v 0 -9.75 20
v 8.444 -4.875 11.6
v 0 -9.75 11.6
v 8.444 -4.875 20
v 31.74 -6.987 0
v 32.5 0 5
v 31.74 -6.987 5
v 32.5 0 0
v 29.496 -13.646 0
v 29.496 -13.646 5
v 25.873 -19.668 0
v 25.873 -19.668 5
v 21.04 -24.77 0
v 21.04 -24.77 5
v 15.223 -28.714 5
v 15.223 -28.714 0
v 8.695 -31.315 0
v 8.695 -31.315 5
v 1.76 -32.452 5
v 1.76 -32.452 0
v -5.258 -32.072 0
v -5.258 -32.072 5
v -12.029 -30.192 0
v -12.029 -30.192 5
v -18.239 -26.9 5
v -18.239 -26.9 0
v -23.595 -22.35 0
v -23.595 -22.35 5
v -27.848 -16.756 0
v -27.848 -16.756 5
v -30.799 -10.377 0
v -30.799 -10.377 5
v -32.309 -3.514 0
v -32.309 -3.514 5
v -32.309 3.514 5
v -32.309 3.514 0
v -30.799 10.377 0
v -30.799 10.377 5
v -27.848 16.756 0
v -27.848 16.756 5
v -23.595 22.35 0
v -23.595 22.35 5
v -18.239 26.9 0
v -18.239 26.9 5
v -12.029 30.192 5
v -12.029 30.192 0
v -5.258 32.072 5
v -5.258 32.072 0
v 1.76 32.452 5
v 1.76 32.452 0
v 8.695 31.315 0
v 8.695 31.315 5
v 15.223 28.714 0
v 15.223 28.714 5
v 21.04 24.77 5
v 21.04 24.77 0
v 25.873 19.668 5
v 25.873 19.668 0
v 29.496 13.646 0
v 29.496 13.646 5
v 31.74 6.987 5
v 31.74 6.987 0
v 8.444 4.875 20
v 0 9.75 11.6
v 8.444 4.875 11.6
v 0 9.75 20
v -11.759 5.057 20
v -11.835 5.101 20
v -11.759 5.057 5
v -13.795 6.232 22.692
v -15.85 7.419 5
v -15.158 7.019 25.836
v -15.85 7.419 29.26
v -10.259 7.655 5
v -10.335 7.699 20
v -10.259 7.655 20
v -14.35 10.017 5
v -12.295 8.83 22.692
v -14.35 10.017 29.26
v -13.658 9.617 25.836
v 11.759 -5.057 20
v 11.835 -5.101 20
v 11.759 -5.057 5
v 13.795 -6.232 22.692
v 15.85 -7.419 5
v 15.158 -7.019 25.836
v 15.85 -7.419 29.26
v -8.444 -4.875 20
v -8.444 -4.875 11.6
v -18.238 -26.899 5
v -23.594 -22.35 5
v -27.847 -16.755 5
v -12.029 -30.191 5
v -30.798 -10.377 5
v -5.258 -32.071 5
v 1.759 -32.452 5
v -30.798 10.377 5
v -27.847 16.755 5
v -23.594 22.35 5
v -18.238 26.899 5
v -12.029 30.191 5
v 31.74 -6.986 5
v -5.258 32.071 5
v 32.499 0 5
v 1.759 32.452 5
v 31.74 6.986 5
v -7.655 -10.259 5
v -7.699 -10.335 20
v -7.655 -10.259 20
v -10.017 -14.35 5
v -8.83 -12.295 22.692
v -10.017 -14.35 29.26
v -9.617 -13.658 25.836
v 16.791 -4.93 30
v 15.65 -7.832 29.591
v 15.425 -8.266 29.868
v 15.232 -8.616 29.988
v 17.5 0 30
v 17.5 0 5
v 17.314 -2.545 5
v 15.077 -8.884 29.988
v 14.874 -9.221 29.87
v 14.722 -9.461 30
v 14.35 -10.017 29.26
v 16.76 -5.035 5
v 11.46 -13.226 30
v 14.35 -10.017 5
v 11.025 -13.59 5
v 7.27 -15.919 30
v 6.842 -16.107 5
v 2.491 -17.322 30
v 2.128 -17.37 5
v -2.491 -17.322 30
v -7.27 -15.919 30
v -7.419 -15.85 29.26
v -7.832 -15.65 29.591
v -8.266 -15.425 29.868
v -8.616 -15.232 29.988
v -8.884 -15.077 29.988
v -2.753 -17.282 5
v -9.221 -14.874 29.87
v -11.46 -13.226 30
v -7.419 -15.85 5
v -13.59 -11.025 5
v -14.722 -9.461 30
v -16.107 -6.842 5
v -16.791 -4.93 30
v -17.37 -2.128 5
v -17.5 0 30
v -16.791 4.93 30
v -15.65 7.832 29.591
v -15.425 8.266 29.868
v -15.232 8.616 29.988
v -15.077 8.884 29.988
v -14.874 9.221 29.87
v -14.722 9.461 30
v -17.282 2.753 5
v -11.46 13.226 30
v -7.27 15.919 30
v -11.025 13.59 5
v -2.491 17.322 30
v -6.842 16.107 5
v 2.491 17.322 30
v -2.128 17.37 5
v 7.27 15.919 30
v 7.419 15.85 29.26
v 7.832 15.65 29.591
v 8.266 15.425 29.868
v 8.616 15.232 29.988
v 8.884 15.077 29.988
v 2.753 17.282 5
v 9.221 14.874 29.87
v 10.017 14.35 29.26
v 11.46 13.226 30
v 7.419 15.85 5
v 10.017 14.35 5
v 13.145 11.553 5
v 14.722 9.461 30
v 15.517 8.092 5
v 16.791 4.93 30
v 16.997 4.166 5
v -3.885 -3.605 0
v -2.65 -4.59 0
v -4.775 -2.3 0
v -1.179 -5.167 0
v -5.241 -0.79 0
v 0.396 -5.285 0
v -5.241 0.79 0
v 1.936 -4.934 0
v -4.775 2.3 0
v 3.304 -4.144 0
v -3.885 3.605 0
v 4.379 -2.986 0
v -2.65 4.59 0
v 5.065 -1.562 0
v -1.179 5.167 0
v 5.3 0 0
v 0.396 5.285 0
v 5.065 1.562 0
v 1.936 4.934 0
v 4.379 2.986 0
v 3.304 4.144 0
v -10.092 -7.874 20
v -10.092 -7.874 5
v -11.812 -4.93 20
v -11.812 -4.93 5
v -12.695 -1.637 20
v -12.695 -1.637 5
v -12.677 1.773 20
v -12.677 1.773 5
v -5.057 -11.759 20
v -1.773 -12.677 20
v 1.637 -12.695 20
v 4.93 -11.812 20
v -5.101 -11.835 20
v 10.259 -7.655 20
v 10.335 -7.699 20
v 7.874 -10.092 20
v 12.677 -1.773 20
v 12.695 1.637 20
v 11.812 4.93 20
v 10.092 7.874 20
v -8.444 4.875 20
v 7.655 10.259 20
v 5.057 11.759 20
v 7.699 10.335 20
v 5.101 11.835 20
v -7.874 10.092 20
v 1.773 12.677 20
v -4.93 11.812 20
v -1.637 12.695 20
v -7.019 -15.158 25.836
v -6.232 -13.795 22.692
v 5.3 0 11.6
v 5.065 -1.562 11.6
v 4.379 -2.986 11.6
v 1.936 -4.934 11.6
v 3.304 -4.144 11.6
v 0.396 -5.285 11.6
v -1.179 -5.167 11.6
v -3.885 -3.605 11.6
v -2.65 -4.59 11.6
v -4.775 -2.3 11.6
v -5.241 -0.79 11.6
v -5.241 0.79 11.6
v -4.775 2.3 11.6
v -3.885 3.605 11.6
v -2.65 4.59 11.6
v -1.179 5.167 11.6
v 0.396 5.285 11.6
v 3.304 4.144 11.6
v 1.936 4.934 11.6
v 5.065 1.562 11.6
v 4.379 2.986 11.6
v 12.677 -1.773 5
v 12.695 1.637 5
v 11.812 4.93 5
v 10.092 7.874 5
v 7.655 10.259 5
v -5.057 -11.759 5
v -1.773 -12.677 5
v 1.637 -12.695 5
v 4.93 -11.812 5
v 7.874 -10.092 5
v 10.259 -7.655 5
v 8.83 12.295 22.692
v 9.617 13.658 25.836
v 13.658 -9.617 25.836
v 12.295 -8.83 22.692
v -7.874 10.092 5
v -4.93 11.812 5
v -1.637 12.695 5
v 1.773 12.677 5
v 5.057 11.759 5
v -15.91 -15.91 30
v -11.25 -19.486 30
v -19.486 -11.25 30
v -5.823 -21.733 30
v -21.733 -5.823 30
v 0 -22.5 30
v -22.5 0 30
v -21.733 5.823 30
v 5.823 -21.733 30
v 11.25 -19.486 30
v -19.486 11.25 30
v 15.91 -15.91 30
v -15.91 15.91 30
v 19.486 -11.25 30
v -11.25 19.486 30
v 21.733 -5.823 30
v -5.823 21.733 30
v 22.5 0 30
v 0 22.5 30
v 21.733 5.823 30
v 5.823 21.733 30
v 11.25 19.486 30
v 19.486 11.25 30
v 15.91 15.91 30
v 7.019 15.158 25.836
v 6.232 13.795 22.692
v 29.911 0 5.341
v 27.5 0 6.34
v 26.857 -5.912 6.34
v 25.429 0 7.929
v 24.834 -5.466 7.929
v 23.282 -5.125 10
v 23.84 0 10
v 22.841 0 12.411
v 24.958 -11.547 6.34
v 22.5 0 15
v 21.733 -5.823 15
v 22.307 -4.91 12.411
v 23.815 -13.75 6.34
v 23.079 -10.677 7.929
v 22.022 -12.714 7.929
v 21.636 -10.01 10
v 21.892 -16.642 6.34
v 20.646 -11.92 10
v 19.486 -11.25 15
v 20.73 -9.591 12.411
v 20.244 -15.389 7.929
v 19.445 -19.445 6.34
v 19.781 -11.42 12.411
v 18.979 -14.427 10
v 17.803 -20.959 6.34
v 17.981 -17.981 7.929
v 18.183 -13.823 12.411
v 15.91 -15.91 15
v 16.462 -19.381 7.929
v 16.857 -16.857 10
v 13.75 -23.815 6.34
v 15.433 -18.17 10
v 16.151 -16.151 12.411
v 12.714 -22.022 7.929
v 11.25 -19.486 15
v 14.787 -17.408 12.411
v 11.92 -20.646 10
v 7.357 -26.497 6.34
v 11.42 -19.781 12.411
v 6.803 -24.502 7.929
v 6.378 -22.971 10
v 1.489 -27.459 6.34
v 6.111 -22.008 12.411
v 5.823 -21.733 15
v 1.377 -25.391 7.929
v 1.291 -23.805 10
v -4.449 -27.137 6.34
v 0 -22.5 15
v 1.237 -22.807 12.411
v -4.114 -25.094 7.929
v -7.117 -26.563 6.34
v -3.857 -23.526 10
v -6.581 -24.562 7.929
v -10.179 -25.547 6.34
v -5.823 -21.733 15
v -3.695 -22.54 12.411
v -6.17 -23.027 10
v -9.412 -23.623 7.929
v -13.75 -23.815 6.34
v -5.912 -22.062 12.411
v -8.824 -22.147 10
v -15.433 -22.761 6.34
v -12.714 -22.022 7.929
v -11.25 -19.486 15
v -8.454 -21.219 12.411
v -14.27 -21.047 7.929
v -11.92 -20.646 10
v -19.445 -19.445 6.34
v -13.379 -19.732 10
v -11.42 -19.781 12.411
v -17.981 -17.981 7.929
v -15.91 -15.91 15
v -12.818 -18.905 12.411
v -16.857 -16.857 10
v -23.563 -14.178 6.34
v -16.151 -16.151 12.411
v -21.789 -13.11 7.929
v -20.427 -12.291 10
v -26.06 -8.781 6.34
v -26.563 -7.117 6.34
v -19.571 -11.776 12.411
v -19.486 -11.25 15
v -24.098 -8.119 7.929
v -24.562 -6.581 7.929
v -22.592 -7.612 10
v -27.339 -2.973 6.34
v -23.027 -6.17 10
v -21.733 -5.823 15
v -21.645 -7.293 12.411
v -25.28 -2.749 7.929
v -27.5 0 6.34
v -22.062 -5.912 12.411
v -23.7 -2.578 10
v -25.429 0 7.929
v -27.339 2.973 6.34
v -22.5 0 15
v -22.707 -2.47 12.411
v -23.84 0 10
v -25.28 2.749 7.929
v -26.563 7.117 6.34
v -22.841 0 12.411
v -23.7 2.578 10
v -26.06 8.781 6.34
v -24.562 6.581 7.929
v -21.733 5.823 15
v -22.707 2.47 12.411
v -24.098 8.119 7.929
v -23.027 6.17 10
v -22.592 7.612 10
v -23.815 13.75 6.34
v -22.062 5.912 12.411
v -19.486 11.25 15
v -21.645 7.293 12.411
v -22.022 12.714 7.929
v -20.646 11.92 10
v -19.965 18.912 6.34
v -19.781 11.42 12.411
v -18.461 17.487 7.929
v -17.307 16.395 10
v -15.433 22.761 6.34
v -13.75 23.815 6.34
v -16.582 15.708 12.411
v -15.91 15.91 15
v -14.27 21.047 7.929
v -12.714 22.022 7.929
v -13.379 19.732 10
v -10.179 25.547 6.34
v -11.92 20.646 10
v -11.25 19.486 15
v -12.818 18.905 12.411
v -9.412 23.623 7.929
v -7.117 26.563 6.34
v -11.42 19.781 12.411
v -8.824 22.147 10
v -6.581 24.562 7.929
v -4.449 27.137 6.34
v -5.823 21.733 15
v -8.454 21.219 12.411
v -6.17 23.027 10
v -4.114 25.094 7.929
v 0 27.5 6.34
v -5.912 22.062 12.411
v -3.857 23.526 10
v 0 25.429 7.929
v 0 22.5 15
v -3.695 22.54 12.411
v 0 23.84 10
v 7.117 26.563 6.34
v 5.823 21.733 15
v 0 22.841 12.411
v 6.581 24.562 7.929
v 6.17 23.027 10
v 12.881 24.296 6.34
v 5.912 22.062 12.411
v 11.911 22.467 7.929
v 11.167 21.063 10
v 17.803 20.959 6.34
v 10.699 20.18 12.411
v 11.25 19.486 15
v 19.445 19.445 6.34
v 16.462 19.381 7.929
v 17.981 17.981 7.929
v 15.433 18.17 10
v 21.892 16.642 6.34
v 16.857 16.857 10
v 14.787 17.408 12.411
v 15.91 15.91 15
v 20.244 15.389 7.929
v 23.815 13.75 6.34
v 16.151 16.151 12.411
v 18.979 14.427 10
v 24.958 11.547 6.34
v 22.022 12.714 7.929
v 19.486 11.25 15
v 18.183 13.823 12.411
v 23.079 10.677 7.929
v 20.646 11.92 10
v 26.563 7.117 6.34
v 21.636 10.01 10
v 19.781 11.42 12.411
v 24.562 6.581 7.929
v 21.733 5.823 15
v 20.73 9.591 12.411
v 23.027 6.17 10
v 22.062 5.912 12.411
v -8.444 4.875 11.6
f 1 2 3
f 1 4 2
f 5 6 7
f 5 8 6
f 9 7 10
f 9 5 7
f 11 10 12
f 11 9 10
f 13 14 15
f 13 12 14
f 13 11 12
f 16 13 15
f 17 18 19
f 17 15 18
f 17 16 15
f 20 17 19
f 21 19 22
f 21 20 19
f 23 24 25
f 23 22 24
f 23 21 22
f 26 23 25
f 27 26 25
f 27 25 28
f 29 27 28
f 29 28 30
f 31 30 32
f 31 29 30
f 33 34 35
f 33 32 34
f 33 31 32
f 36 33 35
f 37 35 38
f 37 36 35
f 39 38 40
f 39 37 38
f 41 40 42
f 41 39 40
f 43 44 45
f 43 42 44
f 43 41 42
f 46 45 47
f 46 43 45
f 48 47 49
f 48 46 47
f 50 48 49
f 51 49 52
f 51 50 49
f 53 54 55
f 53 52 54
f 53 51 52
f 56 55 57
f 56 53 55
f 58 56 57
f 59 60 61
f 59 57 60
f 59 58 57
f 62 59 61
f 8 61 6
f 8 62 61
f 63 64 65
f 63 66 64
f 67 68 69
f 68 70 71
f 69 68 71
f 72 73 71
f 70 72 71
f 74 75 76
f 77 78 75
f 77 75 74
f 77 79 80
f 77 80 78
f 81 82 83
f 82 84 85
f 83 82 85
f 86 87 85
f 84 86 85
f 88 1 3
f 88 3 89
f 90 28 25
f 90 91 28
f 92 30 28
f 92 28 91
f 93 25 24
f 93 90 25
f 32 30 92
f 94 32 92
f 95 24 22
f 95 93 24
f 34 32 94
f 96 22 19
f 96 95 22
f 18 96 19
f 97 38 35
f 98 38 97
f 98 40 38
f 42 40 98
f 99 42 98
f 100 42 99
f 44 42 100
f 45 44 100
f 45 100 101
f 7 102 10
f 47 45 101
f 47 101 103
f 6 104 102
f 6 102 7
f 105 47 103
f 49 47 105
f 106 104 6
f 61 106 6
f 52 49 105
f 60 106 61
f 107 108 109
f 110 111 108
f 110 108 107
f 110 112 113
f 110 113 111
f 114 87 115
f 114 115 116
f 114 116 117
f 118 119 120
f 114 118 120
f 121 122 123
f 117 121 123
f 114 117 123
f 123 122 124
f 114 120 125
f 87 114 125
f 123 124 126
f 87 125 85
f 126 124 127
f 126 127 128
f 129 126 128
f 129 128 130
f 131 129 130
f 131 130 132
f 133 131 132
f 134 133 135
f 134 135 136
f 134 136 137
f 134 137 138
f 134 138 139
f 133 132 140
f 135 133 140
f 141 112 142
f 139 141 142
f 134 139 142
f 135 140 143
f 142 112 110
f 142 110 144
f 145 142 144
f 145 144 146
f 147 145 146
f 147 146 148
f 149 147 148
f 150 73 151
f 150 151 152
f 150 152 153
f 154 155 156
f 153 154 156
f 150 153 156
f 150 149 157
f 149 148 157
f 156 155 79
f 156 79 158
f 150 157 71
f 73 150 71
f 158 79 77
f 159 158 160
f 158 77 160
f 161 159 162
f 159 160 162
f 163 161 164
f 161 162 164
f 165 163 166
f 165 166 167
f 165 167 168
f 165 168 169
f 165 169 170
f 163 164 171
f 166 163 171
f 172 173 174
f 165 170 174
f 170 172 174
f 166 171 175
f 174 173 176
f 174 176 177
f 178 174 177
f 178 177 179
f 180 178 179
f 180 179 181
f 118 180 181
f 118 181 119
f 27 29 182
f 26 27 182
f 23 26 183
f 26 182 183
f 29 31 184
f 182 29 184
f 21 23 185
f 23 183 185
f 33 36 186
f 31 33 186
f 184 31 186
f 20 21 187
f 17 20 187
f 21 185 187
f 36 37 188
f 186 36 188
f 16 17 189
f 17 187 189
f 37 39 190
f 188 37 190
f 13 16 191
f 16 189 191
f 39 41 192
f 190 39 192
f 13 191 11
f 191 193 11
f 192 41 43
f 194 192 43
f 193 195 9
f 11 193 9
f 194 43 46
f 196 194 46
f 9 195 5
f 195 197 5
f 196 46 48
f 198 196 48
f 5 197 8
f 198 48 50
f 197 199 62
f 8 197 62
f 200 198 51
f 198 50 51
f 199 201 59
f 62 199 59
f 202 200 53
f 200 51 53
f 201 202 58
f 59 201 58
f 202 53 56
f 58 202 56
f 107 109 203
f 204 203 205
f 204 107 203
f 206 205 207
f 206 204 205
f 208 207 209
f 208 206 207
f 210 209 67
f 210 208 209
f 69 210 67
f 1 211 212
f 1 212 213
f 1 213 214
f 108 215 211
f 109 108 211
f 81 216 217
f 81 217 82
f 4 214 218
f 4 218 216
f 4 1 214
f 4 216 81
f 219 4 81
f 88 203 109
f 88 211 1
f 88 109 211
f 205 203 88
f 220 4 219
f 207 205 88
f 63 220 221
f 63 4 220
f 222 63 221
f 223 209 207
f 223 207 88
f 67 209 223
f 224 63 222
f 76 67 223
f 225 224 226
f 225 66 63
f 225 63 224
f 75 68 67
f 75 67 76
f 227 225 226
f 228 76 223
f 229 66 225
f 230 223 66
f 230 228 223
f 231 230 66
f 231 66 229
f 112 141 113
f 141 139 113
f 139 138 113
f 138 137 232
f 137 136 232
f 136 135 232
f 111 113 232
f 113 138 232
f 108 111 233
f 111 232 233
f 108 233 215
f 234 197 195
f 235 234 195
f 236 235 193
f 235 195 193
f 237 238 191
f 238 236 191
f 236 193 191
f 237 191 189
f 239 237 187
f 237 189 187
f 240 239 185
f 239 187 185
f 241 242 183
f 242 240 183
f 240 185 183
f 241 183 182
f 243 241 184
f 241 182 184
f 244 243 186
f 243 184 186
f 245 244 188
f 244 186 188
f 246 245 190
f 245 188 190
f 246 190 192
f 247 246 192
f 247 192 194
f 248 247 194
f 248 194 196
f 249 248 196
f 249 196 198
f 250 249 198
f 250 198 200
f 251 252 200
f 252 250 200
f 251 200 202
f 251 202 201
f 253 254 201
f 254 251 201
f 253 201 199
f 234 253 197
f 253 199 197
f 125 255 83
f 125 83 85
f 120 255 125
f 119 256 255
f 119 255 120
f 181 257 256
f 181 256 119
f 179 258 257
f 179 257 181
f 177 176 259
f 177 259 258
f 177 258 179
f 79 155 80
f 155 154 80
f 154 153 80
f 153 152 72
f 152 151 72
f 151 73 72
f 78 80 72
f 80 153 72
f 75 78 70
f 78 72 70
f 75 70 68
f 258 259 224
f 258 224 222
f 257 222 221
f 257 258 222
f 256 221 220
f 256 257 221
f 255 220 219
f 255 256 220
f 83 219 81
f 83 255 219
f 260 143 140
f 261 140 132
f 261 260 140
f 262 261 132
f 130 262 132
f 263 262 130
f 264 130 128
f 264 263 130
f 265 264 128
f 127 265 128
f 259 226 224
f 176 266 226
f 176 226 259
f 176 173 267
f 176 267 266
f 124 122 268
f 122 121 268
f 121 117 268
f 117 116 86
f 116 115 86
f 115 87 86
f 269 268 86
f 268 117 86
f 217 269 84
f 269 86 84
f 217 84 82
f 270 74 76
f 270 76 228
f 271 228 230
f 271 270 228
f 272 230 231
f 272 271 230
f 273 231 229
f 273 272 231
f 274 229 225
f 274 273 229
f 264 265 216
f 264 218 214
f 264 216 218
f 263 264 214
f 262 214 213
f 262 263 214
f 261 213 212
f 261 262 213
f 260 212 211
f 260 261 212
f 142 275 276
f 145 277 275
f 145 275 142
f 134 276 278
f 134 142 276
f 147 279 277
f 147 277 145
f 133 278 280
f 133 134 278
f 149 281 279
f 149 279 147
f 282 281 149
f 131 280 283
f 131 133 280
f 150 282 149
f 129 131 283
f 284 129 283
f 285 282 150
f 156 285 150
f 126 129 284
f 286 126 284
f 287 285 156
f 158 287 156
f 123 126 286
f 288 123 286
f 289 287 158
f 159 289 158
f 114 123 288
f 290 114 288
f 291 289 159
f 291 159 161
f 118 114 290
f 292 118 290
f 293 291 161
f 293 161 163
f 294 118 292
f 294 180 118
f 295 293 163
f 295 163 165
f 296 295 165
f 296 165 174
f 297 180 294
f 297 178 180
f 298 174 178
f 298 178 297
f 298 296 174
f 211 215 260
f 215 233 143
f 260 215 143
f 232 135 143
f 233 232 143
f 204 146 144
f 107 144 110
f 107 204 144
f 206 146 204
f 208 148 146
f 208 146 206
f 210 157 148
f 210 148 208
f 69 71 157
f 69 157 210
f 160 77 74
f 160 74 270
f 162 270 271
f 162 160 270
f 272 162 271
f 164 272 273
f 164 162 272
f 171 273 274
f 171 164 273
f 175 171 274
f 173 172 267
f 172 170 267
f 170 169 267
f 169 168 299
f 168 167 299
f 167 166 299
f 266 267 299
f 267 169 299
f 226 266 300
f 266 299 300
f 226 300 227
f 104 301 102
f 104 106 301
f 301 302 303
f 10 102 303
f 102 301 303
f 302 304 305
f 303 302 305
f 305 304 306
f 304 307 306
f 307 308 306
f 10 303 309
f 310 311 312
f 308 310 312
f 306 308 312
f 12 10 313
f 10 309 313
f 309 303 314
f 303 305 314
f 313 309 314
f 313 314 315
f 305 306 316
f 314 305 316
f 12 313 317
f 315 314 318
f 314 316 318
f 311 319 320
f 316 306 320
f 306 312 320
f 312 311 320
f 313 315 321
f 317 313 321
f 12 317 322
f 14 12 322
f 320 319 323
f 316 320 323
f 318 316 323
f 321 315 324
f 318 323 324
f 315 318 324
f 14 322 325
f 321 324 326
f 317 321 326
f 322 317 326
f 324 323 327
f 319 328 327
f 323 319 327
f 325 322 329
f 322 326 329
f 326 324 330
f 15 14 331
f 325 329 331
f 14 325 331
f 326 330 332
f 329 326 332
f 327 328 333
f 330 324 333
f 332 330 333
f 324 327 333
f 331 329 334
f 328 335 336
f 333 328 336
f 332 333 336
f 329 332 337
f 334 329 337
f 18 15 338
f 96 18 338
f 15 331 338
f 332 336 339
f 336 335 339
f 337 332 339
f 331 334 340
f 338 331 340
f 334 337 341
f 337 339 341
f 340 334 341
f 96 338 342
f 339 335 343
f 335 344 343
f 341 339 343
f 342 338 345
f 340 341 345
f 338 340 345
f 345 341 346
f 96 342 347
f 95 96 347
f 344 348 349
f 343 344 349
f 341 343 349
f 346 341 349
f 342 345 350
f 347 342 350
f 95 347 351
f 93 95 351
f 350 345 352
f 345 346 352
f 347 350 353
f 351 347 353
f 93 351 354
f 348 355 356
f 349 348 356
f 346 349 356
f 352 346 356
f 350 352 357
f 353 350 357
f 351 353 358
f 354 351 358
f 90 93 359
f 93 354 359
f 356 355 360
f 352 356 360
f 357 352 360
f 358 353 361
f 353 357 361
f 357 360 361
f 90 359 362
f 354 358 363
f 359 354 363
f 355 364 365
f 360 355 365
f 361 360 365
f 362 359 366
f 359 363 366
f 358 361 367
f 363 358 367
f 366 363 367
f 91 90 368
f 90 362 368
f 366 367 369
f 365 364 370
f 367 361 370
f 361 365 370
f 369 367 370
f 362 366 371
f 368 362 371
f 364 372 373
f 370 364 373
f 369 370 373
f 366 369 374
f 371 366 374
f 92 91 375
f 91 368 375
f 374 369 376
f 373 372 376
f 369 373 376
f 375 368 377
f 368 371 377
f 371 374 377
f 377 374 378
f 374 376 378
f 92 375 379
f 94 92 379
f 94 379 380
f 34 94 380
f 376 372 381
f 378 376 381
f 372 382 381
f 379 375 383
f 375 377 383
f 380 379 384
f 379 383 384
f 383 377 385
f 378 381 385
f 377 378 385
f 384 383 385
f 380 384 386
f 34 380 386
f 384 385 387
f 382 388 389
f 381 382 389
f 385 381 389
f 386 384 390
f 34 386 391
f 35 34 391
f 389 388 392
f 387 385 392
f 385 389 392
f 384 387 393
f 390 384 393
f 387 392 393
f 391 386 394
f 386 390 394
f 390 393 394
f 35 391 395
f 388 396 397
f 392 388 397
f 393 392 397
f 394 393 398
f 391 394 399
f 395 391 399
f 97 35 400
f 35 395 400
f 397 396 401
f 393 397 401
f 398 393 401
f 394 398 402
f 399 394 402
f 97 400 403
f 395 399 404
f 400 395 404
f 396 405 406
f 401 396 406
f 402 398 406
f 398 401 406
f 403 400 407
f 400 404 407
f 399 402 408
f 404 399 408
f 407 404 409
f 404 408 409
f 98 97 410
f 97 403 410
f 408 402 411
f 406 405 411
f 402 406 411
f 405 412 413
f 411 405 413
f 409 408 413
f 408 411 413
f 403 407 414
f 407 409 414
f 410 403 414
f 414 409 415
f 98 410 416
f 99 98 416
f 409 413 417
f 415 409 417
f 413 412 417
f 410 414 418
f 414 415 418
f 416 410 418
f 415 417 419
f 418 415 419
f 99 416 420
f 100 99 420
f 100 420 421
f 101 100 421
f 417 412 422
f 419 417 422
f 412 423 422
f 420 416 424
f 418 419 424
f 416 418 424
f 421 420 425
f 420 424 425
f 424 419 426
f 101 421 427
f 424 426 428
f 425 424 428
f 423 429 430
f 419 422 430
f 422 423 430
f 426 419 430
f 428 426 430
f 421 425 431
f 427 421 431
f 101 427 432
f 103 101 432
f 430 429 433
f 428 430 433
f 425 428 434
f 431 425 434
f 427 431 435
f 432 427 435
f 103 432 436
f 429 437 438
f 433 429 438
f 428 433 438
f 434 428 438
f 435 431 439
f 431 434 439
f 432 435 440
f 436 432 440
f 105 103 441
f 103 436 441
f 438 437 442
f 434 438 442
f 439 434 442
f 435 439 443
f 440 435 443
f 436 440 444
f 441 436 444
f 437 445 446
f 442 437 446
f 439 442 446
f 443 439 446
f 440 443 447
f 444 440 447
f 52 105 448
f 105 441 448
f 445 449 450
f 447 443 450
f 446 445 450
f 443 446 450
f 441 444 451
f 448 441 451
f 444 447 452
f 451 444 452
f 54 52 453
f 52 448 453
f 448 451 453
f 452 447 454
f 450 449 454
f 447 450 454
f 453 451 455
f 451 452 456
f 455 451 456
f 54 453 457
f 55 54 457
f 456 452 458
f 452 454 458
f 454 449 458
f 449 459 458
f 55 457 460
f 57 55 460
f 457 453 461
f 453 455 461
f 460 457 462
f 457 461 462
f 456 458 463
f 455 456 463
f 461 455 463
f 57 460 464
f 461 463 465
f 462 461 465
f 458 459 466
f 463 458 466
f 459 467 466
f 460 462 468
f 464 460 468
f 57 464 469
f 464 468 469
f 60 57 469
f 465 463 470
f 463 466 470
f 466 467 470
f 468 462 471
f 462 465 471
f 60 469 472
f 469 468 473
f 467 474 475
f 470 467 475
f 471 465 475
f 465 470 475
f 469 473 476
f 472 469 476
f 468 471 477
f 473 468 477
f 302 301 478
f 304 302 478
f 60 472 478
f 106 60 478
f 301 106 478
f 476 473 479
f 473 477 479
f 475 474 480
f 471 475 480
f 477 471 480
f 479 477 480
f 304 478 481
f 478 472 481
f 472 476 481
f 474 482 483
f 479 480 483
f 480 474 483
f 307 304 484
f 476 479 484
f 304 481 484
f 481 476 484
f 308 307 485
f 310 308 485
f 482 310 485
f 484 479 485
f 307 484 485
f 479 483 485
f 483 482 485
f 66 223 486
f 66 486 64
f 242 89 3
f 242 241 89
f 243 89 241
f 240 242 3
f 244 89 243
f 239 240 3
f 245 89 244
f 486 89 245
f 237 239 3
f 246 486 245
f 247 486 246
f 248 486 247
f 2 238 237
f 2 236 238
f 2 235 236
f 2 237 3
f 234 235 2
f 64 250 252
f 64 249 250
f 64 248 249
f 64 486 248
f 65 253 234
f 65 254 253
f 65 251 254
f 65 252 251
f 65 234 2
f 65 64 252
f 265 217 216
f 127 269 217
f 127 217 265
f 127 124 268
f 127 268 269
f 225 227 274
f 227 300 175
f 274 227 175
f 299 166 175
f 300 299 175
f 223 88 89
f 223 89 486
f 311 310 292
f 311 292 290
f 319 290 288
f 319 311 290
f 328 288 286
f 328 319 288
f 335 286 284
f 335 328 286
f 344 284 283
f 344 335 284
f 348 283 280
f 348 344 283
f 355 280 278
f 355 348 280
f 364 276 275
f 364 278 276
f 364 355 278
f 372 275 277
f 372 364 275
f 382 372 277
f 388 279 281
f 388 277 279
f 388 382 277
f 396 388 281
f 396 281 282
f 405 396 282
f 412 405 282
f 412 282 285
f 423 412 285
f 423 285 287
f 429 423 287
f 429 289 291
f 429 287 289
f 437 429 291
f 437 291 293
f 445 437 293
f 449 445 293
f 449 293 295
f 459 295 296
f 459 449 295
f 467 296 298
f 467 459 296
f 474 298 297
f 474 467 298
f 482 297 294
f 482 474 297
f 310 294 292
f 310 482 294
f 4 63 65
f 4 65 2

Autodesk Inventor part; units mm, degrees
ref_plane "YZ Plane" through (0, 0, 0) normal (1, 0, 0) x (0, 1, 0)
ref_plane "XZ Plane" through (0, 0, 0) normal (0, 1, 0) x (-1, 0, 0)
sketch "Sketch1" plane through (0, 0, 0) normal (0, 0, 1) x (1, 0, 0)
  circle A0 centre (0, 0) radius 22.5
  circle A1 centre (0, 0) radius 32.5
  circle A2 centre (0, 0) radius 17.5
  circle A3 centre (0, 0) radius 12.8
  circle A4 centre (0, 0) radius 5.3
  circle A5 centre (0, 0) radius 9.75 construction
  line L0 (0, 9.75) -> (8.4437, 4.875)
  line L1 (8.4437, 4.875) -> (8.4437, -4.875)
  line L2 (8.4437, -4.875) -> (0, -9.75)
  line L3 (0, -9.75) -> (-8.4437, -4.875)
  line L4 (-8.4437, -4.875) -> (-8.4437, 4.875)
  line L5 (-8.4437, 4.875) -> (0, 9.75)
  line L6 (0, 9.75) -> (0, -9.75) construction
  dimension "bolt_head_hub_WAC" = 19.5
  dimension "wheel_diam" = 45
  dimension "d1" = 65
  dimension "d4" = 35
  dimension "d5" = 25.6
  dimension "hub_id" = 10.6
extrude "Extrusion1" add sketch "Sketch1" along normal blind 5 contours A0 | A1 | A2 | A3 | A4 | L0 L1 L2 L3 L4 L5
extrude "Extrusion2" add sketch "Sketch1" along normal blind 30 contours A0
extrude "Extrusion3" add sketch "Sketch1" along normal blind 20 contours A3 | L0 L1 L2 L3 L4 L5
extrude "Extrusion4" cut sketch "Sketch1" against normal blind 8.4 from surface at 20 contours L0 L1 L2 L3 L4 L5
extrude "Extrusion5" cut sketch "Sketch1" along normal up to surface (5 mm away) contours A4
fillet "Fillet1" radius 10 1 edges at (-22.5, 0, 5)
ref_plane "Work Plane1" through (-8.4437, 4.875, 0) normal (-0.5, -0.866, 0) x (0, 0, -1)
sketch "Sketch3" plane through (-8.4437, 4.875, 0) normal (-0.5, -0.866, 0) x (0, 0, -1)
  line L0 (-5, 22.55) -> (-20, 22.55) projected
  line L1 (-5, 27.25) -> (-5, -7.75) projected
  line L2 (-5, -3.05) -> (-5, 22.55) projected
  line L3 (-30, 27.25) -> (-5, 27.25) projected
  line L4 (-20, 22.55) -> (-5, 22.55)
  line L5 (-5, 22.55) -> (-5, 19.55)
  line L6 (-5, 19.55) -> (-20, 19.55)
  line L7 (-20, 19.55) -> (-20, 22.55)
  arc A0 (-20, 22.55) -> (-30, 27.25) centre (-30.9319, 12.279) ccw
  point P0 (0, 9.75)
  dimension "d18" = 3
  dimension "d21" = 15
extrude "Extrusion6" add sketch "Sketch3" along normal mid plane 3
pattern_circular "Circular Pattern1" count 4 over 360 about axis through (0, 0, -10) along (0, 0, 1) of "Extrusion6"
equation "\"bolt_head_hub_WAC\" = bolt_WAC + 2 * printer_tolerance"
equation "\"d1\" = wheel_diam + 2 * flange_extra"
equation "\"d4\" = wheel_diam - 2 * wheel_thick"
equation "\"d5\" = bolt_head_hub_WAC + 2 * bolt_head_hub_clearance"
equation "\"hub_id\" = bolt_od + 2 * printer_tolerance"
equation "\"d8\" = track_w + flange_w"
equation "\"d10\" = flange_w + hub_height"
equation "\"track_w\" = 25"
equation "\"wheel_thick\" = 5"
equation "\"bolt_head_hub_clearance\" = 3.05"
equation "\"hub_height\" = 15"
equation "\"bolt_head_thick\" = 6.4"
equation "\"bolt_WAC\" = 18.9"
equation "\"printer_tolerance\" = 0.3"
equation "\"flange_extra\" = 10"
equation "\"bolt_od\" = 10"
equation "\"flange_w\" = 5"
properties part number "test_wheel_v3"
